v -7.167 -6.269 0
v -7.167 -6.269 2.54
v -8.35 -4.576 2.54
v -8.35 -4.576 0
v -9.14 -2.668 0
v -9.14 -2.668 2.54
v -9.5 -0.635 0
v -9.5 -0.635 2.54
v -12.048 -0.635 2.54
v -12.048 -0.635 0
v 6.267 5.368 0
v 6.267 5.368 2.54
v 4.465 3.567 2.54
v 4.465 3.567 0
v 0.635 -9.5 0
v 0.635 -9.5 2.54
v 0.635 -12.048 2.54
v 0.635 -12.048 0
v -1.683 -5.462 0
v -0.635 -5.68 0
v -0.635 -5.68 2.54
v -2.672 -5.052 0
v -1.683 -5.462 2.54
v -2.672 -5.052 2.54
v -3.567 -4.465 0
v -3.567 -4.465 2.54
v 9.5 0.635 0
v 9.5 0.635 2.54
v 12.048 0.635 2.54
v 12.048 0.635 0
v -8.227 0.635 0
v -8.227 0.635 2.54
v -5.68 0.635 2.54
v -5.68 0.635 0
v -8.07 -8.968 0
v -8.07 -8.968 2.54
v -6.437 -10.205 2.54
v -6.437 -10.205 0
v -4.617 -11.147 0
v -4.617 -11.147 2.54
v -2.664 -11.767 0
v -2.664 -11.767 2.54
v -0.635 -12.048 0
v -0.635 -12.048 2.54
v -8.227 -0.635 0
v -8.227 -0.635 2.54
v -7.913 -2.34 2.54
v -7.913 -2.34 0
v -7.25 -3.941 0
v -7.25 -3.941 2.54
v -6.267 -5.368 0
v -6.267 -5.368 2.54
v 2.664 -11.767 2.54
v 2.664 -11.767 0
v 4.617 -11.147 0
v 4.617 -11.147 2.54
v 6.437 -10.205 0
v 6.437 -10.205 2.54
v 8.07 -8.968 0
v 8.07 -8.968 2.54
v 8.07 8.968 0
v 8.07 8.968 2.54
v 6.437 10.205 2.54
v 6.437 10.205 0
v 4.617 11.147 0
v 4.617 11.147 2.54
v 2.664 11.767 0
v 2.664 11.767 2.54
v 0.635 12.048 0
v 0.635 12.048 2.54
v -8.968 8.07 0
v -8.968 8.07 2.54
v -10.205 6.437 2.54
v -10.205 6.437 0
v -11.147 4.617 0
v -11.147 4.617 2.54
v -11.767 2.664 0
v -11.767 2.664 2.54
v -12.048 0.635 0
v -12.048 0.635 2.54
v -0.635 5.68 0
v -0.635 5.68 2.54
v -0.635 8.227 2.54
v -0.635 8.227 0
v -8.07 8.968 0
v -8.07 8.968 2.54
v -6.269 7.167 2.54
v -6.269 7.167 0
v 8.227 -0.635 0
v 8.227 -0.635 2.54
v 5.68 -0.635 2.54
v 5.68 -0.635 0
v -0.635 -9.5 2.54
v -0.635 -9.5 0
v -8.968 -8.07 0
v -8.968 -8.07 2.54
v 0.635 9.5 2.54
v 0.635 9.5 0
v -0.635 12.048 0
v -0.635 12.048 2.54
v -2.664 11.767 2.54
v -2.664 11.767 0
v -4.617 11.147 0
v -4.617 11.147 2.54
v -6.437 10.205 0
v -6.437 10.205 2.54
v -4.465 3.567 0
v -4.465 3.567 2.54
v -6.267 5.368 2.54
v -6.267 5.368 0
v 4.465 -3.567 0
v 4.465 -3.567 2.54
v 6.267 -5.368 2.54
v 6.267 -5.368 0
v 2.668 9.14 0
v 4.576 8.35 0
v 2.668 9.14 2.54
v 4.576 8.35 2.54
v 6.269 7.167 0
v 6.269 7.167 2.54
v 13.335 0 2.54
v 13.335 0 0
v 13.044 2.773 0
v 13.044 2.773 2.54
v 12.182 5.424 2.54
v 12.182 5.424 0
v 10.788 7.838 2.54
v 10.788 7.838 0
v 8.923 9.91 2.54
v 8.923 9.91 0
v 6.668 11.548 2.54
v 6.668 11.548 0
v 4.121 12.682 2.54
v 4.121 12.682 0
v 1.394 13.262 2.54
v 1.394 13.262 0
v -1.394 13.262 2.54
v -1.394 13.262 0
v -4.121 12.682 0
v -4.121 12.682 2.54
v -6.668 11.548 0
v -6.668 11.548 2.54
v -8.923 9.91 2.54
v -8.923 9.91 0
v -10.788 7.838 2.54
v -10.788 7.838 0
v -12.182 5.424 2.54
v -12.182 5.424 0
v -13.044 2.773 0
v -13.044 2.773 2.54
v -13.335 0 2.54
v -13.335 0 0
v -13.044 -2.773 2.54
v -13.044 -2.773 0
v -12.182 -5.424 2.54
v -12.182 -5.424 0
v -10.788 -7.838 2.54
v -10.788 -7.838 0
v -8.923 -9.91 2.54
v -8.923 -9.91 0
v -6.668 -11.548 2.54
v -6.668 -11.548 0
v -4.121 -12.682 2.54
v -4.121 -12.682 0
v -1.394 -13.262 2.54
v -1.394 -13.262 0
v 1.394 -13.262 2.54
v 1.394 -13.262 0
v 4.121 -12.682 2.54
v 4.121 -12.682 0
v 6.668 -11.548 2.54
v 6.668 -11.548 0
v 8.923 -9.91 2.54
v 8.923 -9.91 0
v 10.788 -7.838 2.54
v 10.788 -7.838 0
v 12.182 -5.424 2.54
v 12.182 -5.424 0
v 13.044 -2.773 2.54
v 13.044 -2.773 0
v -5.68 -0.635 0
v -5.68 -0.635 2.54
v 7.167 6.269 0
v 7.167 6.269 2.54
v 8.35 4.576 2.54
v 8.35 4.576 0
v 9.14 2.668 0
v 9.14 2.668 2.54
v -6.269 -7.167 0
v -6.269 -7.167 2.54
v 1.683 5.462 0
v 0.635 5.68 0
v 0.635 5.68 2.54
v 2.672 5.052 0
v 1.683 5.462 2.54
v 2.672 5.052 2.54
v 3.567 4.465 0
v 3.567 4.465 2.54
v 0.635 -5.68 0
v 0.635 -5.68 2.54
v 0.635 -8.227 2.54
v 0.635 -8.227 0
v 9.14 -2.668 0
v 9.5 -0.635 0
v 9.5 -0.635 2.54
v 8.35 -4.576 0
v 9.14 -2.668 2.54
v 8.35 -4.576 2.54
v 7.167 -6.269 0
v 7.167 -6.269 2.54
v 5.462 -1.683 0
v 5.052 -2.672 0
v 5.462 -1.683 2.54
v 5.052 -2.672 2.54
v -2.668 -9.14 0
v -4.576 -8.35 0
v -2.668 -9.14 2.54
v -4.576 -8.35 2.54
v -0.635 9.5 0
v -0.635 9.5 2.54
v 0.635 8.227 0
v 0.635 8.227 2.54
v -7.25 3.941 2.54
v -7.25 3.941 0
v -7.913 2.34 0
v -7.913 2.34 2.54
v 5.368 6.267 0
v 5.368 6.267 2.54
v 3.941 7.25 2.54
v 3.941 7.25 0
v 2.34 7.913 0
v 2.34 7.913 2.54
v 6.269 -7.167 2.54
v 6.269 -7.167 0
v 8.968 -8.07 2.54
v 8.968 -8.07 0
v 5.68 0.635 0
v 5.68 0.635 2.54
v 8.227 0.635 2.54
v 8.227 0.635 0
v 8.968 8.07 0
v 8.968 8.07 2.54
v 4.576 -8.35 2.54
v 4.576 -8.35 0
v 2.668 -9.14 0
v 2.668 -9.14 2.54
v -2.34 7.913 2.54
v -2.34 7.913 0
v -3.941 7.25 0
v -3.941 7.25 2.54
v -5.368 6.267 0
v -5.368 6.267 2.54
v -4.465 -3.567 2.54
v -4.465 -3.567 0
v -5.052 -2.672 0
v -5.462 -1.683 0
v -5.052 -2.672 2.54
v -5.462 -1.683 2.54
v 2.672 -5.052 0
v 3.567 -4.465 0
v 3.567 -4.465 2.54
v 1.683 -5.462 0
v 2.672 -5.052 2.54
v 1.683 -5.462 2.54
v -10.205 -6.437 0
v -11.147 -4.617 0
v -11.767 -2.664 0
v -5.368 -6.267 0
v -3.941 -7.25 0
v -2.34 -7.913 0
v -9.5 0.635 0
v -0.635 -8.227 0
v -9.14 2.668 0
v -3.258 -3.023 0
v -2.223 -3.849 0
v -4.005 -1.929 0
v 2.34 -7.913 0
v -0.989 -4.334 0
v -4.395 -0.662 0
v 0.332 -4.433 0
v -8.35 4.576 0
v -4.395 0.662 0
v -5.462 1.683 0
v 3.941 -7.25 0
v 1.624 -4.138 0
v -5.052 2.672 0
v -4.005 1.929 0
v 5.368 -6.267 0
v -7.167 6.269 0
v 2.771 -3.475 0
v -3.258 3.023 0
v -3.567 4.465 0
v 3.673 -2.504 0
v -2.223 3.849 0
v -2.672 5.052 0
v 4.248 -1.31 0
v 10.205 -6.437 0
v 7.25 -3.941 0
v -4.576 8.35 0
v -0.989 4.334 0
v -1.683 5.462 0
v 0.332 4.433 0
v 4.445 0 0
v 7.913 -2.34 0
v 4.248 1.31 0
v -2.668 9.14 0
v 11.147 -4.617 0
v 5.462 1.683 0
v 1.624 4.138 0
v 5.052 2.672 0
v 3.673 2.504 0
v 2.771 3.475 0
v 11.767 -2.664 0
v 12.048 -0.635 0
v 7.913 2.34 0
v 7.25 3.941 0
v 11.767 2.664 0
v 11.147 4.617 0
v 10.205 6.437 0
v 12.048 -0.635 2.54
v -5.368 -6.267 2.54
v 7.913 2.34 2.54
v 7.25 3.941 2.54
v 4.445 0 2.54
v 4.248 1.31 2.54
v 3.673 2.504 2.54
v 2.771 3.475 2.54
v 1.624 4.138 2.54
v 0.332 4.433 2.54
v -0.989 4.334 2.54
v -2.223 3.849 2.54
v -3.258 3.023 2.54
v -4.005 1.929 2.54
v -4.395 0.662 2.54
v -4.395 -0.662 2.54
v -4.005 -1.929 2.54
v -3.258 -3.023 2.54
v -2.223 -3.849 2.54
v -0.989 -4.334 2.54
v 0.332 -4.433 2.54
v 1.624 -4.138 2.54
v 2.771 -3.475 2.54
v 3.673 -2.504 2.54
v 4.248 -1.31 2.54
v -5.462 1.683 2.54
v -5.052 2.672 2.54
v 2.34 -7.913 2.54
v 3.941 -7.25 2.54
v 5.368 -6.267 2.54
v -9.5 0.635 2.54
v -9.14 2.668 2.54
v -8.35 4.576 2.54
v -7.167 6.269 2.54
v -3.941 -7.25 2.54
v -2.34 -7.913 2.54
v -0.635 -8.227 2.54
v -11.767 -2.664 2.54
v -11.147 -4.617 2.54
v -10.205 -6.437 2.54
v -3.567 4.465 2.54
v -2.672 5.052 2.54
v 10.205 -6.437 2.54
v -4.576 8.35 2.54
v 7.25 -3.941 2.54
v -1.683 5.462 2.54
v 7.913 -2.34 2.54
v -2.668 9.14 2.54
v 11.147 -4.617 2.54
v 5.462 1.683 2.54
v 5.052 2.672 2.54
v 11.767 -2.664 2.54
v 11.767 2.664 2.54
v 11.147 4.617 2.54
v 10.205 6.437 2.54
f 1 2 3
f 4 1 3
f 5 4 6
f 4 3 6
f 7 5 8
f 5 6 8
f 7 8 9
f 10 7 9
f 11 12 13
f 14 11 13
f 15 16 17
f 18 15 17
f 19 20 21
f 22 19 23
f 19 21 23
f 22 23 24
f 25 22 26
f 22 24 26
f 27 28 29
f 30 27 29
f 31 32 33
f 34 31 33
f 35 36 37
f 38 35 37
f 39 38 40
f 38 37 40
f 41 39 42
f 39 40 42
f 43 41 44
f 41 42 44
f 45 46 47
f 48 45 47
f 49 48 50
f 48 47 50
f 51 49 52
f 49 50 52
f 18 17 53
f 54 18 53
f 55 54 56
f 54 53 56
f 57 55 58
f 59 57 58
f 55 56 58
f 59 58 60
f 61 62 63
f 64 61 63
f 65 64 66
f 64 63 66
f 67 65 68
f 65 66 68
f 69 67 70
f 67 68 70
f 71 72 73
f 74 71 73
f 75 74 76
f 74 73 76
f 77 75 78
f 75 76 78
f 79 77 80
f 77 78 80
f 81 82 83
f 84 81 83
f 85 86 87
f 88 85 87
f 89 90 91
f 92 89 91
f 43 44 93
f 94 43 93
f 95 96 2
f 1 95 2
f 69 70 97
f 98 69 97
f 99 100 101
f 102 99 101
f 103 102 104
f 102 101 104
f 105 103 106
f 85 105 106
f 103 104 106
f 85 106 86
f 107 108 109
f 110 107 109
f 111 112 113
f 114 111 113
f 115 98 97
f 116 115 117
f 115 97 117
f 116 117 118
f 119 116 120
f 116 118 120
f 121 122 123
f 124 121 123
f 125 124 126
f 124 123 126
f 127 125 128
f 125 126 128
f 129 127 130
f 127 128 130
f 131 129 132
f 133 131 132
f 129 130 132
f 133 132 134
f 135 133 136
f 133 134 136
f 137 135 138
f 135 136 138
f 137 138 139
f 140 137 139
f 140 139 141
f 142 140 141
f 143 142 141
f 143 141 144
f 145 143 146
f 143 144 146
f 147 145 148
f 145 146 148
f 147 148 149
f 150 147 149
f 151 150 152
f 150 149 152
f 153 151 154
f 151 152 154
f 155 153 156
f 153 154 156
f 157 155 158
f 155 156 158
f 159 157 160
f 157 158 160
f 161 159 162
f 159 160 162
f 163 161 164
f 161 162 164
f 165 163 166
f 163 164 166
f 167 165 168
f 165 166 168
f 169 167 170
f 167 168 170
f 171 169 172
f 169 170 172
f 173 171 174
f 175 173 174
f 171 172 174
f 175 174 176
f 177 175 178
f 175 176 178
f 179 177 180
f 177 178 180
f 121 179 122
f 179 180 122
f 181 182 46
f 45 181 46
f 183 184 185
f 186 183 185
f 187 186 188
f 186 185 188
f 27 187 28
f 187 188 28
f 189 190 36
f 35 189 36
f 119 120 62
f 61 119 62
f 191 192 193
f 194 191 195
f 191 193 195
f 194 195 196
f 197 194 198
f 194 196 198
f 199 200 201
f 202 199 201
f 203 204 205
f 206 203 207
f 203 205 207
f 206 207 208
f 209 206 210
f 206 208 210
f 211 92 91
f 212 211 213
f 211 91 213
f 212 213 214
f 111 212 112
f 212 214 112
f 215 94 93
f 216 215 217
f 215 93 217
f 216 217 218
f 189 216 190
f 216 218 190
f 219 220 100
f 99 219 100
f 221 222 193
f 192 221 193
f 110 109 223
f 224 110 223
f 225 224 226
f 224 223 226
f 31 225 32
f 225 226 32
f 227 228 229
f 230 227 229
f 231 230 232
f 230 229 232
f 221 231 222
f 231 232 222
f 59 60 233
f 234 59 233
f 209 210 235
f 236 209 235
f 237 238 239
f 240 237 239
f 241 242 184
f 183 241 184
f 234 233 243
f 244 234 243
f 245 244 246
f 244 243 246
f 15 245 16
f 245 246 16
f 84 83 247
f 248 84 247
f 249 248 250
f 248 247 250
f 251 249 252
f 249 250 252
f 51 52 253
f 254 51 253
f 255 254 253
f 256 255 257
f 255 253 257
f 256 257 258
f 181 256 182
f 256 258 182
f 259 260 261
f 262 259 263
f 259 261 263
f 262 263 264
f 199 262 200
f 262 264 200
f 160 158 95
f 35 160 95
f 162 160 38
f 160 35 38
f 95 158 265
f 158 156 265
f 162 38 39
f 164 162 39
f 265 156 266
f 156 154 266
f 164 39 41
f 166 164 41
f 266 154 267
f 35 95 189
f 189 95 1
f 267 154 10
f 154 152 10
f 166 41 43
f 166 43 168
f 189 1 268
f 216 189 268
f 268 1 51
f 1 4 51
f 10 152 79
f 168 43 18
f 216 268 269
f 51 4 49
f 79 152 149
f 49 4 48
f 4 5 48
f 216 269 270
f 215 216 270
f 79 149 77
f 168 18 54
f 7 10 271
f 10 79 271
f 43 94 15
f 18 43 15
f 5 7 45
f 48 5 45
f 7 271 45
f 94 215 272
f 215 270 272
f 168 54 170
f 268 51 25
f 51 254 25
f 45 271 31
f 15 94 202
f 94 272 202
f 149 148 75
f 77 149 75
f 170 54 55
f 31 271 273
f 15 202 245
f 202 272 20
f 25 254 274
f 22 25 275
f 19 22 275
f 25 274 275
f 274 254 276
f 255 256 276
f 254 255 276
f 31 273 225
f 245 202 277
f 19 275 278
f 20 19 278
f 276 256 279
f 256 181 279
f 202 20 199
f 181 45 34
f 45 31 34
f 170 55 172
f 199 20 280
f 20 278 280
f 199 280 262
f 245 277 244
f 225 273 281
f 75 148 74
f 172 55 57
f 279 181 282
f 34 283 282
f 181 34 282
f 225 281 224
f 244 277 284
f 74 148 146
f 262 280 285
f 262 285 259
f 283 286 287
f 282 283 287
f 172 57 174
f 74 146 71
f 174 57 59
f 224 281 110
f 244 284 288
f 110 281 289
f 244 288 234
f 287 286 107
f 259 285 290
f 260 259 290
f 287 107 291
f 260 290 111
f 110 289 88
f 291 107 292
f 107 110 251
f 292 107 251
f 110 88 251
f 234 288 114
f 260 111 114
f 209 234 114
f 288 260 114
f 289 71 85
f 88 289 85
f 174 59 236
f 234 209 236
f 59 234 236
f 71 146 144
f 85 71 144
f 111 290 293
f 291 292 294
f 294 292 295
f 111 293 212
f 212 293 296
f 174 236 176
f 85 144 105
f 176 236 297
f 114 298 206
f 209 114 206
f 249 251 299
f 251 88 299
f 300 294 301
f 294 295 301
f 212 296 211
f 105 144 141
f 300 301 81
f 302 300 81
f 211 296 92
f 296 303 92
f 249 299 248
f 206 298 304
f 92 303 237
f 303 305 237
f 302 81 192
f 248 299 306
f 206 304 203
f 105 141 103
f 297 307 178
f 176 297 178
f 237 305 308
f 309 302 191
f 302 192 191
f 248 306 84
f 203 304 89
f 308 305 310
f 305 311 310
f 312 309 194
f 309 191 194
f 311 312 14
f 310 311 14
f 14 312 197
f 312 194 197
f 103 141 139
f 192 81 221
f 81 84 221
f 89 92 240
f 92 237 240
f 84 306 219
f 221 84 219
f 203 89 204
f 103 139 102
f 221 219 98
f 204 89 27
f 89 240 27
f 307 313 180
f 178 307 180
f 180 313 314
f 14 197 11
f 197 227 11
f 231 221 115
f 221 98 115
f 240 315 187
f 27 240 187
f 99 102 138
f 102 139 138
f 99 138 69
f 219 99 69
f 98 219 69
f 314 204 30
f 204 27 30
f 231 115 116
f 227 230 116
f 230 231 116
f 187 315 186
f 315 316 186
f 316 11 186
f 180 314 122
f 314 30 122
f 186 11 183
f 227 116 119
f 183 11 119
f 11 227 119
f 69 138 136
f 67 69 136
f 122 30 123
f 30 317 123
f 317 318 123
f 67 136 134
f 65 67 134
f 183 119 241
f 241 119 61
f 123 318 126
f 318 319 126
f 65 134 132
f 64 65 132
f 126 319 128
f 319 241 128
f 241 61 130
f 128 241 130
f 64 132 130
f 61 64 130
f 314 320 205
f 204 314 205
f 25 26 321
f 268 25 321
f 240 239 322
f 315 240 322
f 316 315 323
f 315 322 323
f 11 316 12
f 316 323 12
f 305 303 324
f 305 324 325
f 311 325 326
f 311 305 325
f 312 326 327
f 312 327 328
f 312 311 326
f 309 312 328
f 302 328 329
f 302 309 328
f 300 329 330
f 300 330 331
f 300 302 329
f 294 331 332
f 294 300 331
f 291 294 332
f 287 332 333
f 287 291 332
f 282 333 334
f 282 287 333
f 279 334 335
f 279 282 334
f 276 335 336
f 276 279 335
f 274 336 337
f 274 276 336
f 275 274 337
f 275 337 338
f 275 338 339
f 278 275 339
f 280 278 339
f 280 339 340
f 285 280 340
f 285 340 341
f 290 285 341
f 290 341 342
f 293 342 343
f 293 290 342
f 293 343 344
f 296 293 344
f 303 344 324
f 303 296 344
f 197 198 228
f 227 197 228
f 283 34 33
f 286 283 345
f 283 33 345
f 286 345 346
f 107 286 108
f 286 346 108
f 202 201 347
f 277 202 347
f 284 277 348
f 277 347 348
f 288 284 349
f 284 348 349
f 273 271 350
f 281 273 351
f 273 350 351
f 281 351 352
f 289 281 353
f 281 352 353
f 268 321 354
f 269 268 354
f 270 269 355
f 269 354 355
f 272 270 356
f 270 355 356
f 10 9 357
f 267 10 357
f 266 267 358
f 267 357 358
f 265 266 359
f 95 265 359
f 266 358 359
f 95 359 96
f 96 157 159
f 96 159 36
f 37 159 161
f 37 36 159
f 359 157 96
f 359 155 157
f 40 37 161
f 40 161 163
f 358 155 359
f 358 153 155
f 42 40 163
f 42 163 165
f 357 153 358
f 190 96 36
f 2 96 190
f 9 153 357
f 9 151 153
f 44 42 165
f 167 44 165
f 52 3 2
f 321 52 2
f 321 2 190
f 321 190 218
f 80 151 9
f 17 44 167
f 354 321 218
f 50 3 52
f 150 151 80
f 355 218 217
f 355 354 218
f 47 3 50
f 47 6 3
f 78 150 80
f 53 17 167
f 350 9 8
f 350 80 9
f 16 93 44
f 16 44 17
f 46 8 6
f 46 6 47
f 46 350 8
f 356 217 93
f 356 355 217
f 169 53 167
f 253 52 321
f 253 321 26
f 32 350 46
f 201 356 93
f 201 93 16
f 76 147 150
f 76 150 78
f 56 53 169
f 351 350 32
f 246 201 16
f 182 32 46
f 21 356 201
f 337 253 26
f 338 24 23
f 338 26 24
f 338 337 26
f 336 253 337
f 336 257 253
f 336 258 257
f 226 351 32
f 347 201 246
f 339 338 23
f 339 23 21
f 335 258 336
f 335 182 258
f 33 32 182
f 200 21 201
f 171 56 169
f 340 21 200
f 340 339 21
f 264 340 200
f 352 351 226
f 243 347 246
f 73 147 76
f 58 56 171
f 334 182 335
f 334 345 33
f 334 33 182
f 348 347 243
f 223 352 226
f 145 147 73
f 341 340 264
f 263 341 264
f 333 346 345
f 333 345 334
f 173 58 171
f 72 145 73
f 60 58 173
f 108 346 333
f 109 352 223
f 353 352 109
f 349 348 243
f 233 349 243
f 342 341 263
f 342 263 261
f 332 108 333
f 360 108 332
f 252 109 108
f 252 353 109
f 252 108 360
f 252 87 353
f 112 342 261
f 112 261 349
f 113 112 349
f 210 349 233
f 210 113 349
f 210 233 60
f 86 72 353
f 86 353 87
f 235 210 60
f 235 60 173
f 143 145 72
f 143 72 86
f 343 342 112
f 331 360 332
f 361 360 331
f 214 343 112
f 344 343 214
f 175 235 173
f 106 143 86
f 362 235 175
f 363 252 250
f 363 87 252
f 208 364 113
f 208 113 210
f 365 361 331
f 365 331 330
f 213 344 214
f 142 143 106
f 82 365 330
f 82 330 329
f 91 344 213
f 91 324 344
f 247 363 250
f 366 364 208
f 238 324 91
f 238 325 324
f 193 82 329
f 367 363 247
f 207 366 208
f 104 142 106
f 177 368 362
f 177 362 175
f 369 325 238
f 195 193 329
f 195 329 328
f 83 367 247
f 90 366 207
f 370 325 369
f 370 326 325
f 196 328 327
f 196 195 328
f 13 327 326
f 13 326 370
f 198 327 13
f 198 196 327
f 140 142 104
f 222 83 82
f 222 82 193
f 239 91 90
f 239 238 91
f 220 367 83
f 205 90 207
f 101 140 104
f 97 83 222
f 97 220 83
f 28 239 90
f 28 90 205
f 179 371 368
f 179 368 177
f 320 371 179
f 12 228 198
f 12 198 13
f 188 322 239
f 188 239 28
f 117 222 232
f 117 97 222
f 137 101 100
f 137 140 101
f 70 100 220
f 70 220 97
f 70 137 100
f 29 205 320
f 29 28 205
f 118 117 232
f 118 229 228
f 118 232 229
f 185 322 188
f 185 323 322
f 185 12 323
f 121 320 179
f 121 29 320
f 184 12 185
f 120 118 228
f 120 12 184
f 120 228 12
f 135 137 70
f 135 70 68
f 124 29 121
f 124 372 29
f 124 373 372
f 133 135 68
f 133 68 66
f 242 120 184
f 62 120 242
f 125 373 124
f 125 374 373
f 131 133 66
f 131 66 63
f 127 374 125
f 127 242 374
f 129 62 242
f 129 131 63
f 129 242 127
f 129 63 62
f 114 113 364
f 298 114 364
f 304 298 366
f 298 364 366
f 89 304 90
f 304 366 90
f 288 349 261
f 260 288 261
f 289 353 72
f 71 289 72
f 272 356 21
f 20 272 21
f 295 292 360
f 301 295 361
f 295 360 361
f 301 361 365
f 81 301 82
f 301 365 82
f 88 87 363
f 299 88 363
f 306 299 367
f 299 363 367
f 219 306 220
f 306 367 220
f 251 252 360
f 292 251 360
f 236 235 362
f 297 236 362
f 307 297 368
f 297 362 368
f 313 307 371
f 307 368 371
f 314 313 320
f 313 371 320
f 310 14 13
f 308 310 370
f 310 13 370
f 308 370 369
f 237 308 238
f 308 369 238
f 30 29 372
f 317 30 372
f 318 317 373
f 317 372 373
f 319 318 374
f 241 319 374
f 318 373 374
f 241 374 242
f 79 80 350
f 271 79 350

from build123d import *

# Parameters (mm, degrees)
F0_R     = 13.335
F0_R_2   = 4.445
F1_DEPTH = 2.54
F3_DEPTH = 2.541


with BuildPart() as f1:
    # F0 (on Top) → F1 (new body)
    with BuildSketch(Plane.XY):
        Circle(F0_R)
        Circle(F0_R_2, mode=Mode.SUBTRACT)
    extrude(amount=F1_DEPTH)

    # F2 (on face) → F3 (cut, through all)
    with BuildSketch(Plane.XY.offset(2.54)):
        with BuildLine():
            ThreePointArc((-0.635, -5.679613), (-2.187036, -5.279972), (-3.56708, -4.465105))
            Line((-3.56708, -4.465105), (-5.368491, -6.266516))
            ThreePointArc((-5.368491, -6.266516), (-3.157774, -7.623541), (-0.635, -8.227192))
            Line((-0.635, -8.227192), (-0.635, -5.679613))
        make_face()
        with BuildLine():
            Line((-6.26883, -7.166855), (-8.070406, -8.968432))
            ThreePointArc((-8.070406, -8.968432), (-4.617076, -11.146607), (-0.635, -12.048278))
            Line((-0.635, -12.048278), (-0.635, -9.500464))
            ThreePointArc((-0.635, -9.500464), (-3.643782, -8.796868), (-6.26883, -7.166855))
        make_face()
        with BuildLine():
            Line((0.635, -5.679613), (0.635, -8.227192))
            ThreePointArc((0.635, -8.227192), (3.157774, -7.623541), (5.368491, -6.266516))
            Line((5.368491, -6.266516), (3.56708, -4.465105))
            ThreePointArc((3.56708, -4.465105), (2.187036, -5.279972), (0.635, -5.679613))
        make_face()
        with BuildLine():
            Line((0.635, -9.500464), (0.635, -12.048278))
            ThreePointArc((0.635, -12.048278), (4.617076, -11.146607), (8.070406, -8.968432))
            Line((8.070406, -8.968432), (6.26883, -7.166855))
            ThreePointArc((6.26883, -7.166855), (3.643782, -8.796868), (0.635, -9.500464))
        make_face()
        with BuildLine():
            Line((4.465105, -3.56708), (6.266516, -5.368491))
            ThreePointArc((6.266516, -5.368491), (7.623541, -3.157774), (8.227192, -0.635))
            Line((8.227192, -0.635), (5.679613, -0.635))
            ThreePointArc((5.679613, -0.635), (5.279972, -2.187036), (4.465105, -3.56708))
        make_face()
        with BuildLine():
            Line((7.166855, -6.26883), (8.968432, -8.070406))
            ThreePointArc((8.968432, -8.070406), (11.146607, -4.617076), (12.048278, -0.635))
            Line((12.048278, -0.635), (9.500464, -0.635))
            ThreePointArc((9.500464, -0.635), (8.796868, -3.643782), (7.166855, -6.26883))
        make_face()
        with BuildLine():
            Line((5.679613, 0.635), (8.227192, 0.635))
            ThreePointArc((8.227192, 0.635), (7.623541, 3.157774), (6.266516, 5.368491))
            Line((6.266516, 5.368491), (4.465105, 3.56708))
            ThreePointArc((4.465105, 3.56708), (5.279972, 2.187036), (5.679613, 0.635))
        make_face()
        with BuildLine():
            Line((9.500464, 0.635), (12.048278, 0.635))
            ThreePointArc((12.048278, 0.635), (11.146607, 4.617076), (8.968432, 8.070406))
            Line((8.968432, 8.070406), (7.166855, 6.26883))
            ThreePointArc((7.166855, 6.26883), (8.796868, 3.643782), (9.500464, 0.635))
        make_face()
        with BuildLine():
            Line((3.56708, 4.465105), (5.368491, 6.266516))
            ThreePointArc((5.368491, 6.266516), (3.157774, 7.623541), (0.635, 8.227192))
            Line((0.635, 8.227192), (0.635, 5.679613))
            ThreePointArc((0.635, 5.679613), (2.187036, 5.279972), (3.56708, 4.465105))
        make_face()
        with BuildLine():
            Line((6.26883, 7.166855), (8.070406, 8.968432))
            ThreePointArc((8.070406, 8.968432), (4.617076, 11.146607), (0.635, 12.048278))
            Line((0.635, 12.048278), (0.635, 9.500464))
            ThreePointArc((0.635, 9.500464), (3.643782, 8.796868), (6.26883, 7.166855))
        make_face()
        with BuildLine():
            Line((-0.635, 5.679613), (-0.635, 8.227192))
            ThreePointArc((-0.635, 8.227192), (-3.157774, 7.623541), (-5.368491, 6.266516))
            Line((-5.368491, 6.266516), (-3.56708, 4.465105))
            ThreePointArc((-3.56708, 4.465105), (-2.187036, 5.279972), (-0.635, 5.679613))
        make_face()
        with BuildLine():
            Line((-0.635, 9.500464), (-0.635, 12.048278))
            ThreePointArc((-0.635, 12.048278), (-4.617076, 11.146607), (-8.070406, 8.968432))
            Line((-8.070406, 8.968432), (-6.26883, 7.166855))
            ThreePointArc((-6.26883, 7.166855), (-3.643782, 8.796868), (-0.635, 9.500464))
        make_face()
        with BuildLine():
            Line((-4.465105, 3.56708), (-6.266516, 5.368491))
            ThreePointArc((-6.266516, 5.368491), (-7.623541, 3.157774), (-8.227192, 0.635))
            Line((-8.227192, 0.635), (-5.679613, 0.635))
            ThreePointArc((-5.679613, 0.635), (-5.279972, 2.187036), (-4.465105, 3.56708))
        make_face()
        with BuildLine():
            Line((-7.166855, 6.26883), (-8.968432, 8.070406))
            ThreePointArc((-8.968432, 8.070406), (-11.146607, 4.617076), (-12.048278, 0.635))
            Line((-12.048278, 0.635), (-9.500464, 0.635))
            ThreePointArc((-9.500464, 0.635), (-8.796868, 3.643782), (-7.166855, 6.26883))
        make_face()
        with BuildLine():
            Line((-5.679613, -0.635), (-8.227192, -0.635))
            ThreePointArc((-8.227192, -0.635), (-7.623541, -3.157774), (-6.266516, -5.368491))
            Line((-6.266516, -5.368491), (-4.465105, -3.56708))
            ThreePointArc((-4.465105, -3.56708), (-5.279972, -2.187036), (-5.679613, -0.635))
        make_face()
        with BuildLine():
            Line((-9.500464, -0.635), (-12.048278, -0.635))
            ThreePointArc((-12.048278, -0.635), (-11.146607, -4.617076), (-8.968432, -8.070406))
            Line((-8.968432, -8.070406), (-7.166855, -6.26883))
            ThreePointArc((-7.166855, -6.26883), (-8.796868, -3.643782), (-9.500464, -0.635))
        make_face()
    extrude(amount=-F3_DEPTH, mode=Mode.SUBTRACT)


solid = f1.part
